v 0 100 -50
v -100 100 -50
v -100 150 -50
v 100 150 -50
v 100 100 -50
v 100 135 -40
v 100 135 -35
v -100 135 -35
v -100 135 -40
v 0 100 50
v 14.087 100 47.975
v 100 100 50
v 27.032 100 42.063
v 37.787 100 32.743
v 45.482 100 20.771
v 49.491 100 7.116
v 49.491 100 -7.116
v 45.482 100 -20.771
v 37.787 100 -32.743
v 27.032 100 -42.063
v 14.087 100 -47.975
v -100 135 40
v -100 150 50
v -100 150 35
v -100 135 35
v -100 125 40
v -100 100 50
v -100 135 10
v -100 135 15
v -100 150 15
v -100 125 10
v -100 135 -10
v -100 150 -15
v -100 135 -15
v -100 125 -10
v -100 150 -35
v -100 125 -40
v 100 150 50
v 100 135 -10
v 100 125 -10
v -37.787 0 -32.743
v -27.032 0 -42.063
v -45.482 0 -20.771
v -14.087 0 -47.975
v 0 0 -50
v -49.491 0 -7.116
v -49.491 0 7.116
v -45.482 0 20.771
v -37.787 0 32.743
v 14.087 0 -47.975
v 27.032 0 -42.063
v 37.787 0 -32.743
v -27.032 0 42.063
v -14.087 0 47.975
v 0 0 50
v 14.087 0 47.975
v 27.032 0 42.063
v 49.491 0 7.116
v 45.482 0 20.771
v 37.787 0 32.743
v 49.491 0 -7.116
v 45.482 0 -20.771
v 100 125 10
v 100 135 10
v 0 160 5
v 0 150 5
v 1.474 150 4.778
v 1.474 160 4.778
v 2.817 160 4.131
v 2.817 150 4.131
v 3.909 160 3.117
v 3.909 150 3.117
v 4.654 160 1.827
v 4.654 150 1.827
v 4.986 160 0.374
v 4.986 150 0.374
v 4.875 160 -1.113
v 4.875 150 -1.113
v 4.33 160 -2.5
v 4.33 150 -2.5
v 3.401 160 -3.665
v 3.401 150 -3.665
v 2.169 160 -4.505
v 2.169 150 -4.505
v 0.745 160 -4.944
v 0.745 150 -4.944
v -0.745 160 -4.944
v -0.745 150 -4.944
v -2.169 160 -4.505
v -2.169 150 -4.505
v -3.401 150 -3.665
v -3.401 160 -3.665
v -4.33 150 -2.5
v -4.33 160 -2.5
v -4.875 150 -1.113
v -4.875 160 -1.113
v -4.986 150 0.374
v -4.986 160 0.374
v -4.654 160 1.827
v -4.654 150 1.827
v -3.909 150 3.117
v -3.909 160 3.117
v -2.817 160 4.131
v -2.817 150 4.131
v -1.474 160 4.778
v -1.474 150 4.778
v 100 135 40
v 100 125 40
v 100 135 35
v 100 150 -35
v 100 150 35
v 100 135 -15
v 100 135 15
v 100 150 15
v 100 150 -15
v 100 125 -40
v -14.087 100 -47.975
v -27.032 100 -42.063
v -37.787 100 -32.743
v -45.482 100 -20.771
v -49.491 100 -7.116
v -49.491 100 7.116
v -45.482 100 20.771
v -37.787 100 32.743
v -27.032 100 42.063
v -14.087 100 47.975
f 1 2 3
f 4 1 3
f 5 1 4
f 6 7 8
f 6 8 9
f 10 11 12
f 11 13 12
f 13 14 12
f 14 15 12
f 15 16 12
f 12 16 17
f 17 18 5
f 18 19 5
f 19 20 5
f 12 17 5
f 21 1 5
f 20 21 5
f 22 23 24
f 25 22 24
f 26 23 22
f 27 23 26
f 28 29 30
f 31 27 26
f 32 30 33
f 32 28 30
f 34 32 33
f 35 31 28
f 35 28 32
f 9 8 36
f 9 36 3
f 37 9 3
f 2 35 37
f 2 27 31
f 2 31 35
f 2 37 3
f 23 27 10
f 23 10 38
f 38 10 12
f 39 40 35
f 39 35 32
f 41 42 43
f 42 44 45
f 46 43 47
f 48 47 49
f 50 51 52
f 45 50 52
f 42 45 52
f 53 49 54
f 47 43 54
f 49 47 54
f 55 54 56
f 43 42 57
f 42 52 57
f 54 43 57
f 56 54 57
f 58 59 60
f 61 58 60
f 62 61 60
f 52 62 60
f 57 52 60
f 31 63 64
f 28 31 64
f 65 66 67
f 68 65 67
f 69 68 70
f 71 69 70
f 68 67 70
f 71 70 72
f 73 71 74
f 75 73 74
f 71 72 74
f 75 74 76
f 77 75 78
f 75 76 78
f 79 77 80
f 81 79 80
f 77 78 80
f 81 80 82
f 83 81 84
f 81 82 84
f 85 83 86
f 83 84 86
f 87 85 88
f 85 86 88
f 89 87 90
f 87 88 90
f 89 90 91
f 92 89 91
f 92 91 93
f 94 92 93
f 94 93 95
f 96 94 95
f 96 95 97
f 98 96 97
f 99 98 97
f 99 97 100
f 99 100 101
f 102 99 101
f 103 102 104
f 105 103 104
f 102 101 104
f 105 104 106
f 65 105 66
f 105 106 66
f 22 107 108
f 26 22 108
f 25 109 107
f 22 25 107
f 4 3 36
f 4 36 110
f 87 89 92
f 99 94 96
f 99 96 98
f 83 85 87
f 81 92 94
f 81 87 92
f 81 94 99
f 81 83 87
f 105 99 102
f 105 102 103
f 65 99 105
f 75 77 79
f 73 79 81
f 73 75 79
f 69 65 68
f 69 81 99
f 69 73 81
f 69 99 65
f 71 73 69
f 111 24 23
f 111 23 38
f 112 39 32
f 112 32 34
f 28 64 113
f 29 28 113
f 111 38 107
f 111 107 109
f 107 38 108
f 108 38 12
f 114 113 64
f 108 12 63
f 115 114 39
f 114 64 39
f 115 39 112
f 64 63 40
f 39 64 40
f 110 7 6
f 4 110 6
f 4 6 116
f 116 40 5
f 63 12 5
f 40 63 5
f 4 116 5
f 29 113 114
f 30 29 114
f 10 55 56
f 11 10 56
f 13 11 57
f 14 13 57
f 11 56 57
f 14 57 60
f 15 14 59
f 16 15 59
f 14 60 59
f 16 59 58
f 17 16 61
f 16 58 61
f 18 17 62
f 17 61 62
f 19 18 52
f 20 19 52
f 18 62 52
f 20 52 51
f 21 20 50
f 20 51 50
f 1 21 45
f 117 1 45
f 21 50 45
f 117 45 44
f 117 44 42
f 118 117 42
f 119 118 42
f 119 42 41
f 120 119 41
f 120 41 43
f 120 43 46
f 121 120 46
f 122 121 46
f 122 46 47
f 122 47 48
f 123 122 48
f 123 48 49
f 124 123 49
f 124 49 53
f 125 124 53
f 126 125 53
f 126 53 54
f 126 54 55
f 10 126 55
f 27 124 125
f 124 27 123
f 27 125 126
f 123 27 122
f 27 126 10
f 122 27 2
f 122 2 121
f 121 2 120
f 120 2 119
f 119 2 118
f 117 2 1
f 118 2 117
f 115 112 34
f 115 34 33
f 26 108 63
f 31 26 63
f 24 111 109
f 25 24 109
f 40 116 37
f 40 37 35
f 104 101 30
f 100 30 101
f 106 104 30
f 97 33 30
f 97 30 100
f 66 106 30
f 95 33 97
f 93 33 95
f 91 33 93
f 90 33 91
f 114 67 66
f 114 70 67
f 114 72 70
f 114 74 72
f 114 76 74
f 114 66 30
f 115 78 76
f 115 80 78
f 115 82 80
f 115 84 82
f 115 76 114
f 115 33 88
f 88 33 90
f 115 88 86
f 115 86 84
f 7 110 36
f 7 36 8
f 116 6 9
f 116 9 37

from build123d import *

# Parameters (mm, degrees)
SKETCH2_R           = 50
BOSS_EXTRUDE1_DEPTH = 100
SKETCH3_W           = 200
SKETCH3_H           = 100
BOSS_EXTRUDE2_DEPTH = 50
CUT_EXTRUDE1_DEPTH  = 255.95097568
SKETCH5_R           = 5
BOSS_EXTRUDE3_DEPTH = 10


with BuildPart() as part:
    # Sketch2 → Boss-Extrude1 (new body)
    with BuildSketch(Plane(origin=(0, 0, 0), x_dir=(1, 0, 0), z_dir=(0, 1, 0))):
        with Locations(Location((0, 0, 0), (0, 0, 270))):
            Circle(SKETCH2_R)
    extrude(amount=BOSS_EXTRUDE1_DEPTH)

    # Sketch3 → Boss-Extrude2 (add)
    with BuildSketch(Plane(origin=(0, 100, 0), x_dir=(1, 0, 0), z_dir=(0, 1, 0))):
        Rectangle(SKETCH3_W, SKETCH3_H)
    extrude(amount=BOSS_EXTRUDE2_DEPTH)

    # Sketch4 → Cut-Extrude1 (cut, through all)
    with BuildSketch(Plane(origin=(100, 0, 0), x_dir=(0, 0, -1), z_dir=(1, 0, 0))):
        Polygon((-35, 150), (-35, 135), (-40, 135), (-40, 125), (-10, 125), (-10, 135), (-15, 135), (-15, 150), align=None)
        Polygon((40, 135), (40, 125), (10, 125), (10, 135), (15, 135), (15, 150), (35, 150), (35, 135), align=None)
    extrude(amount=-CUT_EXTRUDE1_DEPTH, mode=Mode.SUBTRACT)

    # Sketch5 → Boss-Extrude3 (add)
    with BuildSketch(Plane(origin=(0, 150, 0), x_dir=(1, 0, 0), z_dir=(0, 1, 0))):
        with Locations(Location((0, 0, 0), (0, 0, 270))):
            Circle(SKETCH5_R)
    extrude(amount=BOSS_EXTRUDE3_DEPTH)


solid = part.part
